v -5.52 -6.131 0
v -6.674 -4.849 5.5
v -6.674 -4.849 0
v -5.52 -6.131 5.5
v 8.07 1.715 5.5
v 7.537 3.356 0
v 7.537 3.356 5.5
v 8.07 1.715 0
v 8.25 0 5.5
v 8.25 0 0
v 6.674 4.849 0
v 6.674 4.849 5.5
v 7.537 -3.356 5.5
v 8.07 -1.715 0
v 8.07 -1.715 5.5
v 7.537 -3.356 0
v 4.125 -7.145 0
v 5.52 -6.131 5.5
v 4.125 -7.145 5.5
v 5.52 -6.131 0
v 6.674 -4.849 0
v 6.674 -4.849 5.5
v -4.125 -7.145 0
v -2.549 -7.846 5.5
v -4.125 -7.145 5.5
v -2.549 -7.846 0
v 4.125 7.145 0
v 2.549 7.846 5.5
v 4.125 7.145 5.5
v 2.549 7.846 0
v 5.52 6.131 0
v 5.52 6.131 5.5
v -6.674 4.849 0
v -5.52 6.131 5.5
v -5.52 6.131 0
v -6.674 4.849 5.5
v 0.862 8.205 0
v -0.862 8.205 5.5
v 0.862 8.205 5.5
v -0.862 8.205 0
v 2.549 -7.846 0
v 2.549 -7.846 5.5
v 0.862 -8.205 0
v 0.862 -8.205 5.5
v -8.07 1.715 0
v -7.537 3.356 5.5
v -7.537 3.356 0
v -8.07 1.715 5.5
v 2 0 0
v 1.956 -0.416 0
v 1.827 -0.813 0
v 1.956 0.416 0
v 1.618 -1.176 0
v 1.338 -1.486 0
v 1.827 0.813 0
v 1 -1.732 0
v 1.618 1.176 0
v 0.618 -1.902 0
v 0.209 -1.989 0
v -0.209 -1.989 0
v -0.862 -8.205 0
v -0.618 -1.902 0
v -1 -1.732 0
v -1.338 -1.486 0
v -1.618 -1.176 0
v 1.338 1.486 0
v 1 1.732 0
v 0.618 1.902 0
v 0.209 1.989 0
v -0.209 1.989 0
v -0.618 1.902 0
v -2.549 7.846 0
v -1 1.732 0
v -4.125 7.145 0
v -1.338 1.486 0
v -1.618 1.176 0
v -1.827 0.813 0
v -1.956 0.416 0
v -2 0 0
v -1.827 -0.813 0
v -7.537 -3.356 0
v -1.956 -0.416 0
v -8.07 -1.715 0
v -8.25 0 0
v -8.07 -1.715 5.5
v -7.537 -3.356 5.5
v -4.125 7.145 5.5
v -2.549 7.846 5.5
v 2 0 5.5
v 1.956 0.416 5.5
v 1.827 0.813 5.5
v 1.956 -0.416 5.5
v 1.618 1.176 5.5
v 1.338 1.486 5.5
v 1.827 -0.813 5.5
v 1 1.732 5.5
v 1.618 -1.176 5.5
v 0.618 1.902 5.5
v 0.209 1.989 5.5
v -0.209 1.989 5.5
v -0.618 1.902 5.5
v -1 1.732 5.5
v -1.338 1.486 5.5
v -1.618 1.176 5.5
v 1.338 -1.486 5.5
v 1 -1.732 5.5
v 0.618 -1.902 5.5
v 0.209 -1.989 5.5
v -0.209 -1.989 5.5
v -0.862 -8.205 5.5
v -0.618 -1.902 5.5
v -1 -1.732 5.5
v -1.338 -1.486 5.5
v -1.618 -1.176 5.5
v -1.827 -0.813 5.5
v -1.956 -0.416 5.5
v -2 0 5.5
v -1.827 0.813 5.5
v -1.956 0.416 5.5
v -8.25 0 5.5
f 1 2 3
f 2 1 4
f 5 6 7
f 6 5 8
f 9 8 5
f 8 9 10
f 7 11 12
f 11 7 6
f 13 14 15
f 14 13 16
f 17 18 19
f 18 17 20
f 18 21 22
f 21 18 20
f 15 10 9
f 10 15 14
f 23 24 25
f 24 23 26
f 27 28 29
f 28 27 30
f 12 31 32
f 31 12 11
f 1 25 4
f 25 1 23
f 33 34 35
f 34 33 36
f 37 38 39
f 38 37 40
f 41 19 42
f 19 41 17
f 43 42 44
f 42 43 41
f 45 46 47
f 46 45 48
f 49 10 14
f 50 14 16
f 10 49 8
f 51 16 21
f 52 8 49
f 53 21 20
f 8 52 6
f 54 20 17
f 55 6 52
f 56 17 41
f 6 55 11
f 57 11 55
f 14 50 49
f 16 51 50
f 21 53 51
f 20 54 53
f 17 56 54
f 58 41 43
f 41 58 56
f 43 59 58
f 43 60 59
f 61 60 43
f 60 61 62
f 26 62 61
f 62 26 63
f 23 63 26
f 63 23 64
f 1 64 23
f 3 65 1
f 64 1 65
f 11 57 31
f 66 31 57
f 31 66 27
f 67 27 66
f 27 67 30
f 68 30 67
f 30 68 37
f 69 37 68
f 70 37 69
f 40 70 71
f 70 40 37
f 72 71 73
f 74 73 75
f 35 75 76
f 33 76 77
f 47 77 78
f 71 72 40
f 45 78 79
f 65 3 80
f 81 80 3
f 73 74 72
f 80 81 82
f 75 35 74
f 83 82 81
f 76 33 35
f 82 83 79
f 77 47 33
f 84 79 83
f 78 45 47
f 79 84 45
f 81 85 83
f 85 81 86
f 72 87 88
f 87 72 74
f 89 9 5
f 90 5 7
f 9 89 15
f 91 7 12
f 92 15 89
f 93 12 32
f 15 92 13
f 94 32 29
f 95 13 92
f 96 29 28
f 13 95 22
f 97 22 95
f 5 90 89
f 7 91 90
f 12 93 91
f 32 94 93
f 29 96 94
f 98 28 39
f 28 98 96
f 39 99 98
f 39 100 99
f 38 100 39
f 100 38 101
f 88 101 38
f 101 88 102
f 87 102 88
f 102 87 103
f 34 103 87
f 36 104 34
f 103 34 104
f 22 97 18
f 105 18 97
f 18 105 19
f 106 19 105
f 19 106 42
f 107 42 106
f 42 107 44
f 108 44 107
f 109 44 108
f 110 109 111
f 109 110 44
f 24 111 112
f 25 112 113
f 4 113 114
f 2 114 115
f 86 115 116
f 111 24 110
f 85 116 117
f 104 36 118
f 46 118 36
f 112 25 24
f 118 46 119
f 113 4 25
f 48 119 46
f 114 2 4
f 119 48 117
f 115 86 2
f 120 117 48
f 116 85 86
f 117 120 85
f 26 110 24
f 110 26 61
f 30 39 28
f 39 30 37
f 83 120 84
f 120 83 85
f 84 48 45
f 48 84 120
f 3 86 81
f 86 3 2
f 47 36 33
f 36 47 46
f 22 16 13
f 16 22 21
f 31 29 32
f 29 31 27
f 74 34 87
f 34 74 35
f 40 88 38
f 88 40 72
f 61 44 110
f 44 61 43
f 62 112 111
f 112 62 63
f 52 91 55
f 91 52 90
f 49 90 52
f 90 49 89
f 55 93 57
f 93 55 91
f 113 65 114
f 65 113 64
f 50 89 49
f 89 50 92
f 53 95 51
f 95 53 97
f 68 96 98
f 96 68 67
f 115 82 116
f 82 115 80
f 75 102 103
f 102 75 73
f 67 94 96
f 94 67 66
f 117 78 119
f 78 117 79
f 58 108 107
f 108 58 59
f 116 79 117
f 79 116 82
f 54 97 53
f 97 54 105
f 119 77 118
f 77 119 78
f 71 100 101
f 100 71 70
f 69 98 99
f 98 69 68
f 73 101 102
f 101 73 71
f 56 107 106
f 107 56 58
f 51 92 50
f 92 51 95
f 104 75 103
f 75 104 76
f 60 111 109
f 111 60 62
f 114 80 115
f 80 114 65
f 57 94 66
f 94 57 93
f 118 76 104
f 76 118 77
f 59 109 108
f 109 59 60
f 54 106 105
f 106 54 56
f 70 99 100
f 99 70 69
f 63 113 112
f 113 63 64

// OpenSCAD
difference() {
cylinder(r=16.5/2,h=5.5, $fn=30);
translate([0,0,-1])cylinder(r=2,h=8, $fn=30);
}
